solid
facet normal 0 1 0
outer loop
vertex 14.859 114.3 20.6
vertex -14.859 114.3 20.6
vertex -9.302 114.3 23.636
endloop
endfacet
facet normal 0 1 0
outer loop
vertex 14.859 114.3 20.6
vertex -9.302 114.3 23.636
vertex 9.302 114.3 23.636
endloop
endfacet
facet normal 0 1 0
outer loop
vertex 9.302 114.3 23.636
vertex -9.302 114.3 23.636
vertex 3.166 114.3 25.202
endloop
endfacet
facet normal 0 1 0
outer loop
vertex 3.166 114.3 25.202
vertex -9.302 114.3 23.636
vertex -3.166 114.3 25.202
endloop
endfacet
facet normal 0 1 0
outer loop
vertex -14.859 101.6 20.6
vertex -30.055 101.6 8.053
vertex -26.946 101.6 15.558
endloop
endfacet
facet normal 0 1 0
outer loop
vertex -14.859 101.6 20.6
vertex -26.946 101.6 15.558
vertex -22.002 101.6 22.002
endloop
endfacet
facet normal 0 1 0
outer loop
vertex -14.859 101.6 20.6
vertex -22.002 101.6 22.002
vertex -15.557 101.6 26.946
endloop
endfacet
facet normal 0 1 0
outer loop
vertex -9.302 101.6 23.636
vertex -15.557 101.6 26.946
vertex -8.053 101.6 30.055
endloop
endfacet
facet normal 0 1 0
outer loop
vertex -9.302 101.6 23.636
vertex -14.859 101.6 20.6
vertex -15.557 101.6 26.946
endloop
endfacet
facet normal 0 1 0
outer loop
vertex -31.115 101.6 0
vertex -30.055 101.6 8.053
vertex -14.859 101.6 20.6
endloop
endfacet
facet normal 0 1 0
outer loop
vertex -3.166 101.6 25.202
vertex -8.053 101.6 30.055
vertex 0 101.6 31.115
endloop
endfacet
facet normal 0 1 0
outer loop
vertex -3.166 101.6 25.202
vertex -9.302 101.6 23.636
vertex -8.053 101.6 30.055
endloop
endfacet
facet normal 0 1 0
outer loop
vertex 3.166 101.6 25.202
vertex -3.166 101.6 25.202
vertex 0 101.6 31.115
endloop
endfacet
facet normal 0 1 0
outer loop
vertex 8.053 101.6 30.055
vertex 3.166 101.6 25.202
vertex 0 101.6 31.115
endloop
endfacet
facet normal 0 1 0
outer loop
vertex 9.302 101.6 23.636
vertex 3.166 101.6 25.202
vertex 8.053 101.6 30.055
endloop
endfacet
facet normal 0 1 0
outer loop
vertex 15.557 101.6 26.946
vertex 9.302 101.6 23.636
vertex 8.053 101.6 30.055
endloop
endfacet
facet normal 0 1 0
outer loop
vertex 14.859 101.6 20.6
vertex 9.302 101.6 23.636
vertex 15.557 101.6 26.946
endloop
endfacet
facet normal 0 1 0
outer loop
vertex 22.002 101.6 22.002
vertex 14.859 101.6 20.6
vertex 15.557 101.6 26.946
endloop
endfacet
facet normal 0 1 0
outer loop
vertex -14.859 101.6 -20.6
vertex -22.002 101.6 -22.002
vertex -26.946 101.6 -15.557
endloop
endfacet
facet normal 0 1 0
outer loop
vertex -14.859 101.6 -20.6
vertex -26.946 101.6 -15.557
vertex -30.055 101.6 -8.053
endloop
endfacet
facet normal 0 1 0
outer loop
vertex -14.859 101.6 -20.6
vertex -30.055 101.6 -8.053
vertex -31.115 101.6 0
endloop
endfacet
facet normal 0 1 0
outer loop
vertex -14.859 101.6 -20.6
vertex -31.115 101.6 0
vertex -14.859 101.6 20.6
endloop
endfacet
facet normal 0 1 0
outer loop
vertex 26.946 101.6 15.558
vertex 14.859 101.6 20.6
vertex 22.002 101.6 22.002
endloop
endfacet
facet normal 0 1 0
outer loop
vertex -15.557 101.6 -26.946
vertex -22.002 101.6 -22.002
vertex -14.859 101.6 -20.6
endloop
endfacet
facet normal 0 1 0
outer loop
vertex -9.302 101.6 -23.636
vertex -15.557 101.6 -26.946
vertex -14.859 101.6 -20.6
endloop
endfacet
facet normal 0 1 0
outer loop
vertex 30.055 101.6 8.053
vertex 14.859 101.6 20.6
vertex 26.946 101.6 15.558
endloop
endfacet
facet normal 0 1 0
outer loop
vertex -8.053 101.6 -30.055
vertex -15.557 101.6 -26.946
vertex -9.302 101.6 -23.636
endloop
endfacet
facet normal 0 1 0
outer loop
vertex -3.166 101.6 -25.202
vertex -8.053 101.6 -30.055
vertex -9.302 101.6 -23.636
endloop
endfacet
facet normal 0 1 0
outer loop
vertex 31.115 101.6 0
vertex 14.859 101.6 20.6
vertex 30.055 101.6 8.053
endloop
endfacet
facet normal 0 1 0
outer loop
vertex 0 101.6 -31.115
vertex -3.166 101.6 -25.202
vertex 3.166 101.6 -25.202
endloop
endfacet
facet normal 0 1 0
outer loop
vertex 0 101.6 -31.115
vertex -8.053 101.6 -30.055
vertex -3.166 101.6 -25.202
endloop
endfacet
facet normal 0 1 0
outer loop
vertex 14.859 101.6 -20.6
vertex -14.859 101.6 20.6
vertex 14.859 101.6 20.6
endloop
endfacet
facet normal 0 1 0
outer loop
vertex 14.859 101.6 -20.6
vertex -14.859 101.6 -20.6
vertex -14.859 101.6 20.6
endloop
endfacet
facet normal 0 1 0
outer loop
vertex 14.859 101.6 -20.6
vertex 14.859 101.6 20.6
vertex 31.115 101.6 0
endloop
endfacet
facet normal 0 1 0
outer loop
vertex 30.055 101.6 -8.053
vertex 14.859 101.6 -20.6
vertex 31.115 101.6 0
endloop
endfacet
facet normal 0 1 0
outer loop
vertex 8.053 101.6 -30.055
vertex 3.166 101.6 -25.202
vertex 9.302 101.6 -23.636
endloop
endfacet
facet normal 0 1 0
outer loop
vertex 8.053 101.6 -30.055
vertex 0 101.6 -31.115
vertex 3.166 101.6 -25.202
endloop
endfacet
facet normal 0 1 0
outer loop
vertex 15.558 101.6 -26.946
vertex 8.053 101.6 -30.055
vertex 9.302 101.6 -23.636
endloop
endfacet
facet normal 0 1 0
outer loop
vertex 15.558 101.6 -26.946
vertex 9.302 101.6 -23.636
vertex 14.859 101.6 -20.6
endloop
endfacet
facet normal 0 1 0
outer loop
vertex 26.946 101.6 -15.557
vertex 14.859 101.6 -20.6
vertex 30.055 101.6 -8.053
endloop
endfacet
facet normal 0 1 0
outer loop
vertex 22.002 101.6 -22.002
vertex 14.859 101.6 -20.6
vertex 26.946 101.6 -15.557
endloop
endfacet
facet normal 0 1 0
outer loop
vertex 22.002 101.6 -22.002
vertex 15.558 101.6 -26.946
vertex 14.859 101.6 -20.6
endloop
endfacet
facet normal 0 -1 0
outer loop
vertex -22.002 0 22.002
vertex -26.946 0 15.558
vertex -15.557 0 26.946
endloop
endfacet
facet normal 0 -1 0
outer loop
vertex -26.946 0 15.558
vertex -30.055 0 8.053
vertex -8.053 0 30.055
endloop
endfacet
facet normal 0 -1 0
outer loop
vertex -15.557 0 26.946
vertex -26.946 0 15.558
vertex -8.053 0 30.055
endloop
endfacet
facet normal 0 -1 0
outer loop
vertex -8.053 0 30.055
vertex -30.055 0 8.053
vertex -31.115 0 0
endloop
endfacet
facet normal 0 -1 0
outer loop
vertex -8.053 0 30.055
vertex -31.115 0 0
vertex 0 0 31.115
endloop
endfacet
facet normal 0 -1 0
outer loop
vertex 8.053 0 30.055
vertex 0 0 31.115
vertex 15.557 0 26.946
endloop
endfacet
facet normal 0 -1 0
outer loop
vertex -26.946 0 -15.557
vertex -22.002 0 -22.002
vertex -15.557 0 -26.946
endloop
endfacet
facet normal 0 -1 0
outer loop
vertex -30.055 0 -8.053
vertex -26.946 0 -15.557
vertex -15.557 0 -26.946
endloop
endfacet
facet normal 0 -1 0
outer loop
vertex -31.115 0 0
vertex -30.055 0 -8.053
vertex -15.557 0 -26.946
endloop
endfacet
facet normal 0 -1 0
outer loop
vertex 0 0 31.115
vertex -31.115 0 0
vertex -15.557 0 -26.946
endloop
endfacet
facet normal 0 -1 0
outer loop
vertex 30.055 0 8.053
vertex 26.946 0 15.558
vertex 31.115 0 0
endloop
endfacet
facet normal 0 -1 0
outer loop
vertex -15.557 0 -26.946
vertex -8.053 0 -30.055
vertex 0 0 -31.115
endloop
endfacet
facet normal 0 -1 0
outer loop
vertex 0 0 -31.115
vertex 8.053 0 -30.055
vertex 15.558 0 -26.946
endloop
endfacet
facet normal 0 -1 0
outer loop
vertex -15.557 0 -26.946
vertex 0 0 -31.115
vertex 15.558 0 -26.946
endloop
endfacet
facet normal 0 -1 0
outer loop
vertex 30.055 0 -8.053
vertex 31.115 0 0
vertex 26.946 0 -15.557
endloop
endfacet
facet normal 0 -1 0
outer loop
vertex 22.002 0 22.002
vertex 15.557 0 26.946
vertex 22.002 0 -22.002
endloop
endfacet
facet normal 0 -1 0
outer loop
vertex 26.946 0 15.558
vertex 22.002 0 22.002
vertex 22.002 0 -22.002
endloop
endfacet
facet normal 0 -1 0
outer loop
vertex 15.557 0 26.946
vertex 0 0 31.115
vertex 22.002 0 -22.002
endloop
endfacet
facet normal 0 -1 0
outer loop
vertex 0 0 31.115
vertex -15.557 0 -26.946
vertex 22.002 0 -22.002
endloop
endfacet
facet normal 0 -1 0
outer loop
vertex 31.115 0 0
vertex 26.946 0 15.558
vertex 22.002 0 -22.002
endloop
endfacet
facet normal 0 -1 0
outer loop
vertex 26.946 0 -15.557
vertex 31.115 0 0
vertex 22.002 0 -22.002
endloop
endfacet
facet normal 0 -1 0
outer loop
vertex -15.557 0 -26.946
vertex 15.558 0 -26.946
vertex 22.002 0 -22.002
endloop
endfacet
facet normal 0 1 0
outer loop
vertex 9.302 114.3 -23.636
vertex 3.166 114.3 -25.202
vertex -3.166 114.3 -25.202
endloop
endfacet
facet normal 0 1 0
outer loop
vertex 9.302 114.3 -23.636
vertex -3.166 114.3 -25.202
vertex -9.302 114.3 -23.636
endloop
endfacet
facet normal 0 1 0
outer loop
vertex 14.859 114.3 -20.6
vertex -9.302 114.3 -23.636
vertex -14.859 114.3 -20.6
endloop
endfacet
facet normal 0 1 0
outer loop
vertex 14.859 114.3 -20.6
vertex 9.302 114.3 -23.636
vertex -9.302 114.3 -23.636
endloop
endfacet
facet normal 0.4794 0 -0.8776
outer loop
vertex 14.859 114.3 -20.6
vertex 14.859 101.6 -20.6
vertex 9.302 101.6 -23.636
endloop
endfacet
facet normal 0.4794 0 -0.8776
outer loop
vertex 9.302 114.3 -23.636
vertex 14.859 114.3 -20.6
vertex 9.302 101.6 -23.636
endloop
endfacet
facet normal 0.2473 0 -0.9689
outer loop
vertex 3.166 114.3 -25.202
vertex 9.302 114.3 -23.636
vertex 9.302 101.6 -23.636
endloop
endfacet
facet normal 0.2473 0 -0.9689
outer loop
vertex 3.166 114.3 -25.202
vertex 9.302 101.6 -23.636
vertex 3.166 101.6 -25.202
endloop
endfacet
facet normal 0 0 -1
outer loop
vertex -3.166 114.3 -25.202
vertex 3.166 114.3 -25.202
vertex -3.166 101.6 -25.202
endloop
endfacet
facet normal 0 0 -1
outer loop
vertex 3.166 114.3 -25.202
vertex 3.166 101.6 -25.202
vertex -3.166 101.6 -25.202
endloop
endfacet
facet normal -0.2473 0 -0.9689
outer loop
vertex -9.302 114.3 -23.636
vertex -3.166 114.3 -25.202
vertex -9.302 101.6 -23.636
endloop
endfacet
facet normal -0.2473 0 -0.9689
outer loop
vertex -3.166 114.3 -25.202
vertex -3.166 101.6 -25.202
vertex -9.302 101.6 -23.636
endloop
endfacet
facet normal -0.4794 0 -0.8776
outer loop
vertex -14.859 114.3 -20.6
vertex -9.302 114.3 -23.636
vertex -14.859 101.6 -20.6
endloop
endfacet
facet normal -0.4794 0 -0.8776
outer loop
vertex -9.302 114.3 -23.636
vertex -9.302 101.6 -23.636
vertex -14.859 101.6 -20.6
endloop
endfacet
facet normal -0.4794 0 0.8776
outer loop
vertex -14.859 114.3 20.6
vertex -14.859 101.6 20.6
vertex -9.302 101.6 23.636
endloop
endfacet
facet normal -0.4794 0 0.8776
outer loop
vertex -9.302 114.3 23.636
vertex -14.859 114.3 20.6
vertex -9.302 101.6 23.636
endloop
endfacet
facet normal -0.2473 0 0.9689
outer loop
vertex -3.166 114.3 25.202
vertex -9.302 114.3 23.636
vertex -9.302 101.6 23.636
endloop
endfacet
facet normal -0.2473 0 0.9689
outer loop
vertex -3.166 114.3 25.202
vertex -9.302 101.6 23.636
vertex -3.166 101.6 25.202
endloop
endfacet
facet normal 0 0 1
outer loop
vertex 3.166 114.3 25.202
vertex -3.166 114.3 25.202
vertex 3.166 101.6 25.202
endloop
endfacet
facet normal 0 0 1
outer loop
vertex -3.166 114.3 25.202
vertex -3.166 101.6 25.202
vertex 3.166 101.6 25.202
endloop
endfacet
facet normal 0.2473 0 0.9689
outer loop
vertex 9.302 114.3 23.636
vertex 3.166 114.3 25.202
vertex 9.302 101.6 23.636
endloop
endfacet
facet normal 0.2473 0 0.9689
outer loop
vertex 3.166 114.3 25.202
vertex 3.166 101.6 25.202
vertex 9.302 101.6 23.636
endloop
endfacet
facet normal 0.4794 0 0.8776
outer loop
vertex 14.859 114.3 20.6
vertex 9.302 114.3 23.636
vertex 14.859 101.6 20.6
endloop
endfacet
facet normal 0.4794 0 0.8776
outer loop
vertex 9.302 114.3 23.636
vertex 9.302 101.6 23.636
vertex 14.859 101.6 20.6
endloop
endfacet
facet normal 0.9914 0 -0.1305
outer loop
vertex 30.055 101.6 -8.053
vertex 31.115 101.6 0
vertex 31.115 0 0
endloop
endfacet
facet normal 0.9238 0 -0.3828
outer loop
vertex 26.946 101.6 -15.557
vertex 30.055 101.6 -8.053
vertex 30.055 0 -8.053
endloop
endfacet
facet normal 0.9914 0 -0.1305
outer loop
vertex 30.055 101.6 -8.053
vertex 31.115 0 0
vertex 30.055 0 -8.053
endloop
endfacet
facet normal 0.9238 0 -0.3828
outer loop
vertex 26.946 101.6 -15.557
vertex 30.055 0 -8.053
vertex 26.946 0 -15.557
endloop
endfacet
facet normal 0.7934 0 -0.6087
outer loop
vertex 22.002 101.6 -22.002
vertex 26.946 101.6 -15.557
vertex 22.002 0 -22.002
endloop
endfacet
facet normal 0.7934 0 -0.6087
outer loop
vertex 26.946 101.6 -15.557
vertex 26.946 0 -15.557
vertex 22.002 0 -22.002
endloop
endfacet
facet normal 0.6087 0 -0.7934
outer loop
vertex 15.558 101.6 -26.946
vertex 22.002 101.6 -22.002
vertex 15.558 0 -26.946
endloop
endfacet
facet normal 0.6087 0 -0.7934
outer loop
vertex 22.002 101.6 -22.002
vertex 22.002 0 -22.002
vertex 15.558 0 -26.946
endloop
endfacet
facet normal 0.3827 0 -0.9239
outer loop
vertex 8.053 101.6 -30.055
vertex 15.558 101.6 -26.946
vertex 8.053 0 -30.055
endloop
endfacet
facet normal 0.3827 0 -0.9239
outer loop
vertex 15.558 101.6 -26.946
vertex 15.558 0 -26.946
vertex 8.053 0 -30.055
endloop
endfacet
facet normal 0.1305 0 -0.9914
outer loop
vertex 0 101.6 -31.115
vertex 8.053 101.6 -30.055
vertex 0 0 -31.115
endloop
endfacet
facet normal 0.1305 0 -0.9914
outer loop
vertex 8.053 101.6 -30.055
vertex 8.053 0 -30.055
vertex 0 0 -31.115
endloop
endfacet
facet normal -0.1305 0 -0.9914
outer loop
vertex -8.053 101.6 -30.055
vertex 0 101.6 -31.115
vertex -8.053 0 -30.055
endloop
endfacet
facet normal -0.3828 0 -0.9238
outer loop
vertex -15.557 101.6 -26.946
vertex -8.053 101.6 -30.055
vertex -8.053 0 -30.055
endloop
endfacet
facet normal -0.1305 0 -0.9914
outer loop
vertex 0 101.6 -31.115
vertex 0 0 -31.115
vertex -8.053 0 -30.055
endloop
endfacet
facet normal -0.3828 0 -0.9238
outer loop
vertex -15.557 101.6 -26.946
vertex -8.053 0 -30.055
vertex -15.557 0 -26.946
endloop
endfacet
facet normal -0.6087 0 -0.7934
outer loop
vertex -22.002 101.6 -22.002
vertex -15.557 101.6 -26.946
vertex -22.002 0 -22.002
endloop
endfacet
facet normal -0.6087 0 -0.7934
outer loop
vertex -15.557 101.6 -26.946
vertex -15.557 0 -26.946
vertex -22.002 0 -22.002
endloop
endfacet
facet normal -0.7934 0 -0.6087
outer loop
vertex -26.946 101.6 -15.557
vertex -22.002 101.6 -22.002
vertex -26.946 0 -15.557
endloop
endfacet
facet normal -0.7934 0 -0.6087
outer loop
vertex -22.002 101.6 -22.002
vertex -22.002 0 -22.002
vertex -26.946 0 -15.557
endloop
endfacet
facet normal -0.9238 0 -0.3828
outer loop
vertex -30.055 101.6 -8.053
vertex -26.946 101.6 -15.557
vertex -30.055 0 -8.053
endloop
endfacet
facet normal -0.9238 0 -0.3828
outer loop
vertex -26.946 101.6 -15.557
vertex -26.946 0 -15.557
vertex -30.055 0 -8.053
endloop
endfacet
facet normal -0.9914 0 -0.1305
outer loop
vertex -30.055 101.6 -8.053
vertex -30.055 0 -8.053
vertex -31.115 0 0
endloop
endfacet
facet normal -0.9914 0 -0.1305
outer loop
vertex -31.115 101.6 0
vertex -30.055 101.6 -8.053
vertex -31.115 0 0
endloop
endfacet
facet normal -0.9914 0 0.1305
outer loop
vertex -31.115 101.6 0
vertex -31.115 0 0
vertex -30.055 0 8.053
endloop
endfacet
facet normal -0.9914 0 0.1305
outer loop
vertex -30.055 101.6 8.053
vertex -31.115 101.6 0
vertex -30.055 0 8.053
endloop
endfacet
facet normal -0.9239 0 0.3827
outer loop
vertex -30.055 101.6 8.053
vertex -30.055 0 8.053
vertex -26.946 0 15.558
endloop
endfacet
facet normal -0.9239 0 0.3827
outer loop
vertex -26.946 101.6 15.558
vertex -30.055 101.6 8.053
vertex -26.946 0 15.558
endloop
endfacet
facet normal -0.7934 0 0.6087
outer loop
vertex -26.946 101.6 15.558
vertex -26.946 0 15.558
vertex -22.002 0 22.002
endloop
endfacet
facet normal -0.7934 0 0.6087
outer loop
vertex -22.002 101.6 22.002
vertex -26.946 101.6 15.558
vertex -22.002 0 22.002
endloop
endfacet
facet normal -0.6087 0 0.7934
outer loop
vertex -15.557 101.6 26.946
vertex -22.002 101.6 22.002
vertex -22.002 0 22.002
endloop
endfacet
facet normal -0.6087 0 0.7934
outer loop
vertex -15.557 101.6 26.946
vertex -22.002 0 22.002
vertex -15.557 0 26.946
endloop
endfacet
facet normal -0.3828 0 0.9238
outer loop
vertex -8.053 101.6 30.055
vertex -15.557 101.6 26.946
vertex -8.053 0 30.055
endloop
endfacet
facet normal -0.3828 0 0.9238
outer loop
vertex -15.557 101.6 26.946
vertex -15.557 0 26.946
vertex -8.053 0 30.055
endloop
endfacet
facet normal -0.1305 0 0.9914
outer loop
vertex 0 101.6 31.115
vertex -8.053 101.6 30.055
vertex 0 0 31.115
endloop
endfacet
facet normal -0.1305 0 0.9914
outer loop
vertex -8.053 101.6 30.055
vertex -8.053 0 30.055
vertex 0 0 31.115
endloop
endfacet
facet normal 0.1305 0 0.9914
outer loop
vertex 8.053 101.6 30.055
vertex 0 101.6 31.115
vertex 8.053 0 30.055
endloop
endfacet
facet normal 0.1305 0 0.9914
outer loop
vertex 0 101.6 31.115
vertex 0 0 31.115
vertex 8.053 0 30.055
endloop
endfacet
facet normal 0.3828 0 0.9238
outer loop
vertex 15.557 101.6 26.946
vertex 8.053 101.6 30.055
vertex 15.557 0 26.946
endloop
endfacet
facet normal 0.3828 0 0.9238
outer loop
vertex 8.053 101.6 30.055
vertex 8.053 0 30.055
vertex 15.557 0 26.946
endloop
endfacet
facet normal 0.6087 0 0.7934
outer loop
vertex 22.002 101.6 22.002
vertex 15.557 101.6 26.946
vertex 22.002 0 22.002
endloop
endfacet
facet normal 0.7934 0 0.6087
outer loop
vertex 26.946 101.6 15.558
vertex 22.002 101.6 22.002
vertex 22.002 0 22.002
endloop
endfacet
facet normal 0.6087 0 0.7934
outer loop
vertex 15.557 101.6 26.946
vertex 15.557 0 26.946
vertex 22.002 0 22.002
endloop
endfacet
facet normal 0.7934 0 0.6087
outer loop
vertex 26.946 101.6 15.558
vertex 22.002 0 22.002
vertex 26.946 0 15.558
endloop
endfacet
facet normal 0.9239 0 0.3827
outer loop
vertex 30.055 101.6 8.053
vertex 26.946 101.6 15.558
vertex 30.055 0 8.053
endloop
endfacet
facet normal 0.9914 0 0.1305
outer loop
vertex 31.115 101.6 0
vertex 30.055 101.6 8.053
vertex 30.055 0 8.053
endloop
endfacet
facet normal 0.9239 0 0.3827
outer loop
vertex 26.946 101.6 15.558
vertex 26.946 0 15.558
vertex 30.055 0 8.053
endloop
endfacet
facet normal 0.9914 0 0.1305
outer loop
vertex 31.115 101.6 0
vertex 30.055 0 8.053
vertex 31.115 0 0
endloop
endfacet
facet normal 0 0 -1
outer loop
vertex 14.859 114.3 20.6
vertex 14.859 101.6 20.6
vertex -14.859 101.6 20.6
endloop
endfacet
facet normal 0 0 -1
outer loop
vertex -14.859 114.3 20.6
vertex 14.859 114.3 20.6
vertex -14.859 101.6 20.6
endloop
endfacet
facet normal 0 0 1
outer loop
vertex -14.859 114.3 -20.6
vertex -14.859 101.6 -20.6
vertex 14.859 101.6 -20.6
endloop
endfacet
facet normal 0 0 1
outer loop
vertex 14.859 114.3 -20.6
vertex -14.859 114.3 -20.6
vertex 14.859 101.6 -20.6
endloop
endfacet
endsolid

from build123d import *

# Parameters (mm, degrees)
SKETCH1_R           = 31.115
BOSS_EXTRUDE4_DEPTH = 101.6
BOSS_EXTRUDE6_DEPTH = 12.7


with BuildPart() as part:
    # Sketch1 → Boss-Extrude4 (new body)
    with BuildSketch(Plane(origin=(0, 0, 0), x_dir=(1, 0, 0), z_dir=(0, 1, 0))):
        Circle(SKETCH1_R)
    extrude(amount=BOSS_EXTRUDE4_DEPTH)

    # Sketch4 → Boss-Extrude6 (add)
    with BuildSketch(Plane(origin=(0, 101.6, 0), x_dir=(1, 0, 0), z_dir=(0, 1, 0))):
        with BuildLine():
            ThreePointArc((14.859, 20.600245605), (0, 25.4), (-14.859, 20.600245605))
            Line((-14.859, 20.600245605), (14.859, 20.600245605))
        make_face()
        with BuildLine():
            Line((14.859, -20.600245605), (-14.859, -20.600245605))
            ThreePointArc((-14.859, -20.600245605), (0, -25.4), (14.859, -20.600245605))
        make_face()
    extrude(amount=BOSS_EXTRUDE6_DEPTH)


solid = part.part
